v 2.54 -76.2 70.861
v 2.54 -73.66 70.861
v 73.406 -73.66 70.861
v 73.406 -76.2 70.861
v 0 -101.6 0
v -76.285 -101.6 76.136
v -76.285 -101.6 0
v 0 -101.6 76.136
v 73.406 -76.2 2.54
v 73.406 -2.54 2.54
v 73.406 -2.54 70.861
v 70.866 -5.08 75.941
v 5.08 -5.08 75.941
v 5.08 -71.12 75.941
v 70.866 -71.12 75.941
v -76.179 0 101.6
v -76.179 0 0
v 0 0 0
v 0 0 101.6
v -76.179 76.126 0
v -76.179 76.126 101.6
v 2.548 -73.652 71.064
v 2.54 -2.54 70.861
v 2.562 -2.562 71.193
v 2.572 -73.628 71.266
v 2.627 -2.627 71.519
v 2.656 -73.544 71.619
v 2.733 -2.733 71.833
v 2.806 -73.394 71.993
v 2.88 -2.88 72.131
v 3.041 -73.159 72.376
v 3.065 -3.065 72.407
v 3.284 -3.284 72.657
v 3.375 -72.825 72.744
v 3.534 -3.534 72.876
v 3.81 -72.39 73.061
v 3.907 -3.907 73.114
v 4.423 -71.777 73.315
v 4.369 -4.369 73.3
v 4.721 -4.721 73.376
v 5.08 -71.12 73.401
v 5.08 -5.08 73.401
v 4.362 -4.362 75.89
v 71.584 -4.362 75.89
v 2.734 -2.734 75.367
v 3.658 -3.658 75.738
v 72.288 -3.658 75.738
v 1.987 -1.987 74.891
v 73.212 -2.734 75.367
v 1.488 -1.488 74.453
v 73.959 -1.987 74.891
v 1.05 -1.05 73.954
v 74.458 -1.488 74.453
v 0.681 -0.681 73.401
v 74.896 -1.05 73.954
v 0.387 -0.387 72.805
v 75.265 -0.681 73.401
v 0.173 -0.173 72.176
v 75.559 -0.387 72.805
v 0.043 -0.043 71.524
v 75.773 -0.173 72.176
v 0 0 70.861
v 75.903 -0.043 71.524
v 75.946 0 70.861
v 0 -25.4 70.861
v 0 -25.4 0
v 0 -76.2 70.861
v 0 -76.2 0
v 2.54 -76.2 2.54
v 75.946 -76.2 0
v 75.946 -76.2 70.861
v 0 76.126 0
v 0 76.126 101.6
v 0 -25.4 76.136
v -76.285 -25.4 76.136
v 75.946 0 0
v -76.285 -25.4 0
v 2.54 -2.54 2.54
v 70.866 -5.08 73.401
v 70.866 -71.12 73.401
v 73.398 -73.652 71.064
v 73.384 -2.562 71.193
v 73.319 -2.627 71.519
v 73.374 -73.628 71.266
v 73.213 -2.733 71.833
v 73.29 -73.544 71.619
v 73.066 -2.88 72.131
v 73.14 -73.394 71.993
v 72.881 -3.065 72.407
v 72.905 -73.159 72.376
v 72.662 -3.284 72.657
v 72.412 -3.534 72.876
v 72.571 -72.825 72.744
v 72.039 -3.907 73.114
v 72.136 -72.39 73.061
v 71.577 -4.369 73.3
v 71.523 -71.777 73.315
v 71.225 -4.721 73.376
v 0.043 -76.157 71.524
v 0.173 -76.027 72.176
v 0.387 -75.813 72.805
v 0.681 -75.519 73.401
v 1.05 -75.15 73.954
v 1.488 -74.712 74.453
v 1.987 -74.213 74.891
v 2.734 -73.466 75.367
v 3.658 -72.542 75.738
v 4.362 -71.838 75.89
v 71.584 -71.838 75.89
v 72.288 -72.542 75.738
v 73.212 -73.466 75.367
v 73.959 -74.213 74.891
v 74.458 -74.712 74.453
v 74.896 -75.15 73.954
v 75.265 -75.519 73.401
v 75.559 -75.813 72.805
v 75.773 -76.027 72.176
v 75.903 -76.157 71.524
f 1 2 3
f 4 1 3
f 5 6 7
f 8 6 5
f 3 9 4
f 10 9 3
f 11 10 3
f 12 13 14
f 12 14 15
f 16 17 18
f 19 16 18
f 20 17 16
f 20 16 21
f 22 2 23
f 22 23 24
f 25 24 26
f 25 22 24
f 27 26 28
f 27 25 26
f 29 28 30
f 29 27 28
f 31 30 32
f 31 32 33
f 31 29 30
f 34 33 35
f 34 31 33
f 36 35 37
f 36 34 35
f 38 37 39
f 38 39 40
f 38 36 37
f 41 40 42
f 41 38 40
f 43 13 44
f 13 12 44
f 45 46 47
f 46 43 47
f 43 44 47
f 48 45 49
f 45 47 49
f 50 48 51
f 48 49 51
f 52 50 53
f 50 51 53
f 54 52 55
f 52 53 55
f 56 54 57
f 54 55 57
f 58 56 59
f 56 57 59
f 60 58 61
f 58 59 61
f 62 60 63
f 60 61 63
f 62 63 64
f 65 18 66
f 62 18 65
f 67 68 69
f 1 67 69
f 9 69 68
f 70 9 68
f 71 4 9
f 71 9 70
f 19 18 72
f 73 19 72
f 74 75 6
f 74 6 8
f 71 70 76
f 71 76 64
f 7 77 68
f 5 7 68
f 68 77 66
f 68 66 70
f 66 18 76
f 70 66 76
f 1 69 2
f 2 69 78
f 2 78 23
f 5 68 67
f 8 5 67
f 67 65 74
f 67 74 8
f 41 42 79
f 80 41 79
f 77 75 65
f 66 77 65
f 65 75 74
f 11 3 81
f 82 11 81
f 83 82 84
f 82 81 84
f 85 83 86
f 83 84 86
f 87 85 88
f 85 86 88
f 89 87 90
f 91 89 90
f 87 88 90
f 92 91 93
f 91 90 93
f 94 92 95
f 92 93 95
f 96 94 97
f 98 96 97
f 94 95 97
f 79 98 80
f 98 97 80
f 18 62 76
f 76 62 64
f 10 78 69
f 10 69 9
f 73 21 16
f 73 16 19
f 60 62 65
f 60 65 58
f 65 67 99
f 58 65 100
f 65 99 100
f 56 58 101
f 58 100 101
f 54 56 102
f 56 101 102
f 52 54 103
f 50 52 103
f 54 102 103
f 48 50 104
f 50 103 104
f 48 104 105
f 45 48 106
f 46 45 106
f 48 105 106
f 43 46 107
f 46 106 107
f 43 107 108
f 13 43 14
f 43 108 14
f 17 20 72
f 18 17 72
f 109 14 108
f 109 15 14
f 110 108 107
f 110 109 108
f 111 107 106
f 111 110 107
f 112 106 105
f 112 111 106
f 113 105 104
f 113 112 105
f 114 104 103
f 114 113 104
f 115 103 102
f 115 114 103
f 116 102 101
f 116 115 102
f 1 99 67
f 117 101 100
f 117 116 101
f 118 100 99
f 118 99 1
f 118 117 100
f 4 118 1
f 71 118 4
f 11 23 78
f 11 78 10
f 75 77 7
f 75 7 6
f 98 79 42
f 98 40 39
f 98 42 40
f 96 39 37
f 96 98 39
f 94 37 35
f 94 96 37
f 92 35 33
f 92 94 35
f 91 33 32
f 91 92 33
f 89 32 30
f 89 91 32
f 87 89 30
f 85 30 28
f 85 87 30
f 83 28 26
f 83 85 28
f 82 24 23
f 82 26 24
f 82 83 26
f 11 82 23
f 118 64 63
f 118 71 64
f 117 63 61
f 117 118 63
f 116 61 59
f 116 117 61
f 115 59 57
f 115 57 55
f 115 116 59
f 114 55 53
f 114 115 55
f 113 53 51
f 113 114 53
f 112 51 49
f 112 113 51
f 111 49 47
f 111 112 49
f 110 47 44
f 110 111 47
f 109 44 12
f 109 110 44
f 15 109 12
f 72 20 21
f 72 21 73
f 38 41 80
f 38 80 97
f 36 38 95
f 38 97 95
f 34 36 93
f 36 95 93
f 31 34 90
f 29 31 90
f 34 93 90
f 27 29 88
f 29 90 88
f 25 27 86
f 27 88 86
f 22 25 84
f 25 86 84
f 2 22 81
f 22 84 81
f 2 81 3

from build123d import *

# Parameters (mm, degrees)
F0_W     = 75.946
F0_H     = 75.9411230683
F1_DEPTH = 76.2
F3_R     = 5.08
F4_T     = -2.54
F5_W     = 76.2851387262
F5_H     = 76.1361420155
F6_DEPTH = 76.2
F7_W     = 76.178714633
F7_H     = 76.1255025864
F8_DEPTH = 101.6


# Not quite as in the source:
# - a shell that OpenCascade refuses in one call is made with other operations: the cavity is built on its own and cut out


with BuildPart() as f1:
    # F0 (on Front) → F1 (new body)
    with BuildSketch(Plane.XZ):
        with Locations((37.973, 37.9705615342)):
            Rectangle(F0_W, F0_H)
    extrude(amount=F1_DEPTH)

    # F3
    f3_edges = [f1.edges().sort_by_distance(p)[0] for p in [
        (75.946, -38.1, 75.941123),
        (0, -38.1, 75.941123),
        (37.973, 0, 75.941123),
        (37.973, -76.2, 75.941123),
    ]]
    fillet(f3_edges, radius=F3_R)

    # F4: a shell. OpenCascade refuses it in one call, so the cavity is built on its own and cut out:
    # the body offset inwards by the wall thickness, plus a prism from it out through each open face.
    f4_core = offset(f1.part, amount=F4_T, mode=Mode.PRIVATE)
    f4_exits = [f4_core.faces().sort_by_distance(p)[0] for p in [
        (37.973, -73.66, 36.700562),
    ]]
    add(f4_core, mode=Mode.SUBTRACT)
    extrude(f4_exits, amount=-F4_T, mode=Mode.SUBTRACT)

    # F5 (on offset) → F6 (join)
    with BuildSketch(Plane.XZ.offset(25.4)):
        with Locations((-38.1425693631, 38.0680710077)):
            Rectangle(F5_W, F5_H)
    extrude(amount=F6_DEPTH)


with BuildPart() as f8:
    # F7 (on Top) → F8 (new body)
    with BuildSketch(Plane.XY):
        with Locations((-38.0893573165, 38.0627512932)):
            Rectangle(F7_W, F7_H)
    extrude(amount=F8_DEPTH)


solid = Compound([f1.part, f8.part])
